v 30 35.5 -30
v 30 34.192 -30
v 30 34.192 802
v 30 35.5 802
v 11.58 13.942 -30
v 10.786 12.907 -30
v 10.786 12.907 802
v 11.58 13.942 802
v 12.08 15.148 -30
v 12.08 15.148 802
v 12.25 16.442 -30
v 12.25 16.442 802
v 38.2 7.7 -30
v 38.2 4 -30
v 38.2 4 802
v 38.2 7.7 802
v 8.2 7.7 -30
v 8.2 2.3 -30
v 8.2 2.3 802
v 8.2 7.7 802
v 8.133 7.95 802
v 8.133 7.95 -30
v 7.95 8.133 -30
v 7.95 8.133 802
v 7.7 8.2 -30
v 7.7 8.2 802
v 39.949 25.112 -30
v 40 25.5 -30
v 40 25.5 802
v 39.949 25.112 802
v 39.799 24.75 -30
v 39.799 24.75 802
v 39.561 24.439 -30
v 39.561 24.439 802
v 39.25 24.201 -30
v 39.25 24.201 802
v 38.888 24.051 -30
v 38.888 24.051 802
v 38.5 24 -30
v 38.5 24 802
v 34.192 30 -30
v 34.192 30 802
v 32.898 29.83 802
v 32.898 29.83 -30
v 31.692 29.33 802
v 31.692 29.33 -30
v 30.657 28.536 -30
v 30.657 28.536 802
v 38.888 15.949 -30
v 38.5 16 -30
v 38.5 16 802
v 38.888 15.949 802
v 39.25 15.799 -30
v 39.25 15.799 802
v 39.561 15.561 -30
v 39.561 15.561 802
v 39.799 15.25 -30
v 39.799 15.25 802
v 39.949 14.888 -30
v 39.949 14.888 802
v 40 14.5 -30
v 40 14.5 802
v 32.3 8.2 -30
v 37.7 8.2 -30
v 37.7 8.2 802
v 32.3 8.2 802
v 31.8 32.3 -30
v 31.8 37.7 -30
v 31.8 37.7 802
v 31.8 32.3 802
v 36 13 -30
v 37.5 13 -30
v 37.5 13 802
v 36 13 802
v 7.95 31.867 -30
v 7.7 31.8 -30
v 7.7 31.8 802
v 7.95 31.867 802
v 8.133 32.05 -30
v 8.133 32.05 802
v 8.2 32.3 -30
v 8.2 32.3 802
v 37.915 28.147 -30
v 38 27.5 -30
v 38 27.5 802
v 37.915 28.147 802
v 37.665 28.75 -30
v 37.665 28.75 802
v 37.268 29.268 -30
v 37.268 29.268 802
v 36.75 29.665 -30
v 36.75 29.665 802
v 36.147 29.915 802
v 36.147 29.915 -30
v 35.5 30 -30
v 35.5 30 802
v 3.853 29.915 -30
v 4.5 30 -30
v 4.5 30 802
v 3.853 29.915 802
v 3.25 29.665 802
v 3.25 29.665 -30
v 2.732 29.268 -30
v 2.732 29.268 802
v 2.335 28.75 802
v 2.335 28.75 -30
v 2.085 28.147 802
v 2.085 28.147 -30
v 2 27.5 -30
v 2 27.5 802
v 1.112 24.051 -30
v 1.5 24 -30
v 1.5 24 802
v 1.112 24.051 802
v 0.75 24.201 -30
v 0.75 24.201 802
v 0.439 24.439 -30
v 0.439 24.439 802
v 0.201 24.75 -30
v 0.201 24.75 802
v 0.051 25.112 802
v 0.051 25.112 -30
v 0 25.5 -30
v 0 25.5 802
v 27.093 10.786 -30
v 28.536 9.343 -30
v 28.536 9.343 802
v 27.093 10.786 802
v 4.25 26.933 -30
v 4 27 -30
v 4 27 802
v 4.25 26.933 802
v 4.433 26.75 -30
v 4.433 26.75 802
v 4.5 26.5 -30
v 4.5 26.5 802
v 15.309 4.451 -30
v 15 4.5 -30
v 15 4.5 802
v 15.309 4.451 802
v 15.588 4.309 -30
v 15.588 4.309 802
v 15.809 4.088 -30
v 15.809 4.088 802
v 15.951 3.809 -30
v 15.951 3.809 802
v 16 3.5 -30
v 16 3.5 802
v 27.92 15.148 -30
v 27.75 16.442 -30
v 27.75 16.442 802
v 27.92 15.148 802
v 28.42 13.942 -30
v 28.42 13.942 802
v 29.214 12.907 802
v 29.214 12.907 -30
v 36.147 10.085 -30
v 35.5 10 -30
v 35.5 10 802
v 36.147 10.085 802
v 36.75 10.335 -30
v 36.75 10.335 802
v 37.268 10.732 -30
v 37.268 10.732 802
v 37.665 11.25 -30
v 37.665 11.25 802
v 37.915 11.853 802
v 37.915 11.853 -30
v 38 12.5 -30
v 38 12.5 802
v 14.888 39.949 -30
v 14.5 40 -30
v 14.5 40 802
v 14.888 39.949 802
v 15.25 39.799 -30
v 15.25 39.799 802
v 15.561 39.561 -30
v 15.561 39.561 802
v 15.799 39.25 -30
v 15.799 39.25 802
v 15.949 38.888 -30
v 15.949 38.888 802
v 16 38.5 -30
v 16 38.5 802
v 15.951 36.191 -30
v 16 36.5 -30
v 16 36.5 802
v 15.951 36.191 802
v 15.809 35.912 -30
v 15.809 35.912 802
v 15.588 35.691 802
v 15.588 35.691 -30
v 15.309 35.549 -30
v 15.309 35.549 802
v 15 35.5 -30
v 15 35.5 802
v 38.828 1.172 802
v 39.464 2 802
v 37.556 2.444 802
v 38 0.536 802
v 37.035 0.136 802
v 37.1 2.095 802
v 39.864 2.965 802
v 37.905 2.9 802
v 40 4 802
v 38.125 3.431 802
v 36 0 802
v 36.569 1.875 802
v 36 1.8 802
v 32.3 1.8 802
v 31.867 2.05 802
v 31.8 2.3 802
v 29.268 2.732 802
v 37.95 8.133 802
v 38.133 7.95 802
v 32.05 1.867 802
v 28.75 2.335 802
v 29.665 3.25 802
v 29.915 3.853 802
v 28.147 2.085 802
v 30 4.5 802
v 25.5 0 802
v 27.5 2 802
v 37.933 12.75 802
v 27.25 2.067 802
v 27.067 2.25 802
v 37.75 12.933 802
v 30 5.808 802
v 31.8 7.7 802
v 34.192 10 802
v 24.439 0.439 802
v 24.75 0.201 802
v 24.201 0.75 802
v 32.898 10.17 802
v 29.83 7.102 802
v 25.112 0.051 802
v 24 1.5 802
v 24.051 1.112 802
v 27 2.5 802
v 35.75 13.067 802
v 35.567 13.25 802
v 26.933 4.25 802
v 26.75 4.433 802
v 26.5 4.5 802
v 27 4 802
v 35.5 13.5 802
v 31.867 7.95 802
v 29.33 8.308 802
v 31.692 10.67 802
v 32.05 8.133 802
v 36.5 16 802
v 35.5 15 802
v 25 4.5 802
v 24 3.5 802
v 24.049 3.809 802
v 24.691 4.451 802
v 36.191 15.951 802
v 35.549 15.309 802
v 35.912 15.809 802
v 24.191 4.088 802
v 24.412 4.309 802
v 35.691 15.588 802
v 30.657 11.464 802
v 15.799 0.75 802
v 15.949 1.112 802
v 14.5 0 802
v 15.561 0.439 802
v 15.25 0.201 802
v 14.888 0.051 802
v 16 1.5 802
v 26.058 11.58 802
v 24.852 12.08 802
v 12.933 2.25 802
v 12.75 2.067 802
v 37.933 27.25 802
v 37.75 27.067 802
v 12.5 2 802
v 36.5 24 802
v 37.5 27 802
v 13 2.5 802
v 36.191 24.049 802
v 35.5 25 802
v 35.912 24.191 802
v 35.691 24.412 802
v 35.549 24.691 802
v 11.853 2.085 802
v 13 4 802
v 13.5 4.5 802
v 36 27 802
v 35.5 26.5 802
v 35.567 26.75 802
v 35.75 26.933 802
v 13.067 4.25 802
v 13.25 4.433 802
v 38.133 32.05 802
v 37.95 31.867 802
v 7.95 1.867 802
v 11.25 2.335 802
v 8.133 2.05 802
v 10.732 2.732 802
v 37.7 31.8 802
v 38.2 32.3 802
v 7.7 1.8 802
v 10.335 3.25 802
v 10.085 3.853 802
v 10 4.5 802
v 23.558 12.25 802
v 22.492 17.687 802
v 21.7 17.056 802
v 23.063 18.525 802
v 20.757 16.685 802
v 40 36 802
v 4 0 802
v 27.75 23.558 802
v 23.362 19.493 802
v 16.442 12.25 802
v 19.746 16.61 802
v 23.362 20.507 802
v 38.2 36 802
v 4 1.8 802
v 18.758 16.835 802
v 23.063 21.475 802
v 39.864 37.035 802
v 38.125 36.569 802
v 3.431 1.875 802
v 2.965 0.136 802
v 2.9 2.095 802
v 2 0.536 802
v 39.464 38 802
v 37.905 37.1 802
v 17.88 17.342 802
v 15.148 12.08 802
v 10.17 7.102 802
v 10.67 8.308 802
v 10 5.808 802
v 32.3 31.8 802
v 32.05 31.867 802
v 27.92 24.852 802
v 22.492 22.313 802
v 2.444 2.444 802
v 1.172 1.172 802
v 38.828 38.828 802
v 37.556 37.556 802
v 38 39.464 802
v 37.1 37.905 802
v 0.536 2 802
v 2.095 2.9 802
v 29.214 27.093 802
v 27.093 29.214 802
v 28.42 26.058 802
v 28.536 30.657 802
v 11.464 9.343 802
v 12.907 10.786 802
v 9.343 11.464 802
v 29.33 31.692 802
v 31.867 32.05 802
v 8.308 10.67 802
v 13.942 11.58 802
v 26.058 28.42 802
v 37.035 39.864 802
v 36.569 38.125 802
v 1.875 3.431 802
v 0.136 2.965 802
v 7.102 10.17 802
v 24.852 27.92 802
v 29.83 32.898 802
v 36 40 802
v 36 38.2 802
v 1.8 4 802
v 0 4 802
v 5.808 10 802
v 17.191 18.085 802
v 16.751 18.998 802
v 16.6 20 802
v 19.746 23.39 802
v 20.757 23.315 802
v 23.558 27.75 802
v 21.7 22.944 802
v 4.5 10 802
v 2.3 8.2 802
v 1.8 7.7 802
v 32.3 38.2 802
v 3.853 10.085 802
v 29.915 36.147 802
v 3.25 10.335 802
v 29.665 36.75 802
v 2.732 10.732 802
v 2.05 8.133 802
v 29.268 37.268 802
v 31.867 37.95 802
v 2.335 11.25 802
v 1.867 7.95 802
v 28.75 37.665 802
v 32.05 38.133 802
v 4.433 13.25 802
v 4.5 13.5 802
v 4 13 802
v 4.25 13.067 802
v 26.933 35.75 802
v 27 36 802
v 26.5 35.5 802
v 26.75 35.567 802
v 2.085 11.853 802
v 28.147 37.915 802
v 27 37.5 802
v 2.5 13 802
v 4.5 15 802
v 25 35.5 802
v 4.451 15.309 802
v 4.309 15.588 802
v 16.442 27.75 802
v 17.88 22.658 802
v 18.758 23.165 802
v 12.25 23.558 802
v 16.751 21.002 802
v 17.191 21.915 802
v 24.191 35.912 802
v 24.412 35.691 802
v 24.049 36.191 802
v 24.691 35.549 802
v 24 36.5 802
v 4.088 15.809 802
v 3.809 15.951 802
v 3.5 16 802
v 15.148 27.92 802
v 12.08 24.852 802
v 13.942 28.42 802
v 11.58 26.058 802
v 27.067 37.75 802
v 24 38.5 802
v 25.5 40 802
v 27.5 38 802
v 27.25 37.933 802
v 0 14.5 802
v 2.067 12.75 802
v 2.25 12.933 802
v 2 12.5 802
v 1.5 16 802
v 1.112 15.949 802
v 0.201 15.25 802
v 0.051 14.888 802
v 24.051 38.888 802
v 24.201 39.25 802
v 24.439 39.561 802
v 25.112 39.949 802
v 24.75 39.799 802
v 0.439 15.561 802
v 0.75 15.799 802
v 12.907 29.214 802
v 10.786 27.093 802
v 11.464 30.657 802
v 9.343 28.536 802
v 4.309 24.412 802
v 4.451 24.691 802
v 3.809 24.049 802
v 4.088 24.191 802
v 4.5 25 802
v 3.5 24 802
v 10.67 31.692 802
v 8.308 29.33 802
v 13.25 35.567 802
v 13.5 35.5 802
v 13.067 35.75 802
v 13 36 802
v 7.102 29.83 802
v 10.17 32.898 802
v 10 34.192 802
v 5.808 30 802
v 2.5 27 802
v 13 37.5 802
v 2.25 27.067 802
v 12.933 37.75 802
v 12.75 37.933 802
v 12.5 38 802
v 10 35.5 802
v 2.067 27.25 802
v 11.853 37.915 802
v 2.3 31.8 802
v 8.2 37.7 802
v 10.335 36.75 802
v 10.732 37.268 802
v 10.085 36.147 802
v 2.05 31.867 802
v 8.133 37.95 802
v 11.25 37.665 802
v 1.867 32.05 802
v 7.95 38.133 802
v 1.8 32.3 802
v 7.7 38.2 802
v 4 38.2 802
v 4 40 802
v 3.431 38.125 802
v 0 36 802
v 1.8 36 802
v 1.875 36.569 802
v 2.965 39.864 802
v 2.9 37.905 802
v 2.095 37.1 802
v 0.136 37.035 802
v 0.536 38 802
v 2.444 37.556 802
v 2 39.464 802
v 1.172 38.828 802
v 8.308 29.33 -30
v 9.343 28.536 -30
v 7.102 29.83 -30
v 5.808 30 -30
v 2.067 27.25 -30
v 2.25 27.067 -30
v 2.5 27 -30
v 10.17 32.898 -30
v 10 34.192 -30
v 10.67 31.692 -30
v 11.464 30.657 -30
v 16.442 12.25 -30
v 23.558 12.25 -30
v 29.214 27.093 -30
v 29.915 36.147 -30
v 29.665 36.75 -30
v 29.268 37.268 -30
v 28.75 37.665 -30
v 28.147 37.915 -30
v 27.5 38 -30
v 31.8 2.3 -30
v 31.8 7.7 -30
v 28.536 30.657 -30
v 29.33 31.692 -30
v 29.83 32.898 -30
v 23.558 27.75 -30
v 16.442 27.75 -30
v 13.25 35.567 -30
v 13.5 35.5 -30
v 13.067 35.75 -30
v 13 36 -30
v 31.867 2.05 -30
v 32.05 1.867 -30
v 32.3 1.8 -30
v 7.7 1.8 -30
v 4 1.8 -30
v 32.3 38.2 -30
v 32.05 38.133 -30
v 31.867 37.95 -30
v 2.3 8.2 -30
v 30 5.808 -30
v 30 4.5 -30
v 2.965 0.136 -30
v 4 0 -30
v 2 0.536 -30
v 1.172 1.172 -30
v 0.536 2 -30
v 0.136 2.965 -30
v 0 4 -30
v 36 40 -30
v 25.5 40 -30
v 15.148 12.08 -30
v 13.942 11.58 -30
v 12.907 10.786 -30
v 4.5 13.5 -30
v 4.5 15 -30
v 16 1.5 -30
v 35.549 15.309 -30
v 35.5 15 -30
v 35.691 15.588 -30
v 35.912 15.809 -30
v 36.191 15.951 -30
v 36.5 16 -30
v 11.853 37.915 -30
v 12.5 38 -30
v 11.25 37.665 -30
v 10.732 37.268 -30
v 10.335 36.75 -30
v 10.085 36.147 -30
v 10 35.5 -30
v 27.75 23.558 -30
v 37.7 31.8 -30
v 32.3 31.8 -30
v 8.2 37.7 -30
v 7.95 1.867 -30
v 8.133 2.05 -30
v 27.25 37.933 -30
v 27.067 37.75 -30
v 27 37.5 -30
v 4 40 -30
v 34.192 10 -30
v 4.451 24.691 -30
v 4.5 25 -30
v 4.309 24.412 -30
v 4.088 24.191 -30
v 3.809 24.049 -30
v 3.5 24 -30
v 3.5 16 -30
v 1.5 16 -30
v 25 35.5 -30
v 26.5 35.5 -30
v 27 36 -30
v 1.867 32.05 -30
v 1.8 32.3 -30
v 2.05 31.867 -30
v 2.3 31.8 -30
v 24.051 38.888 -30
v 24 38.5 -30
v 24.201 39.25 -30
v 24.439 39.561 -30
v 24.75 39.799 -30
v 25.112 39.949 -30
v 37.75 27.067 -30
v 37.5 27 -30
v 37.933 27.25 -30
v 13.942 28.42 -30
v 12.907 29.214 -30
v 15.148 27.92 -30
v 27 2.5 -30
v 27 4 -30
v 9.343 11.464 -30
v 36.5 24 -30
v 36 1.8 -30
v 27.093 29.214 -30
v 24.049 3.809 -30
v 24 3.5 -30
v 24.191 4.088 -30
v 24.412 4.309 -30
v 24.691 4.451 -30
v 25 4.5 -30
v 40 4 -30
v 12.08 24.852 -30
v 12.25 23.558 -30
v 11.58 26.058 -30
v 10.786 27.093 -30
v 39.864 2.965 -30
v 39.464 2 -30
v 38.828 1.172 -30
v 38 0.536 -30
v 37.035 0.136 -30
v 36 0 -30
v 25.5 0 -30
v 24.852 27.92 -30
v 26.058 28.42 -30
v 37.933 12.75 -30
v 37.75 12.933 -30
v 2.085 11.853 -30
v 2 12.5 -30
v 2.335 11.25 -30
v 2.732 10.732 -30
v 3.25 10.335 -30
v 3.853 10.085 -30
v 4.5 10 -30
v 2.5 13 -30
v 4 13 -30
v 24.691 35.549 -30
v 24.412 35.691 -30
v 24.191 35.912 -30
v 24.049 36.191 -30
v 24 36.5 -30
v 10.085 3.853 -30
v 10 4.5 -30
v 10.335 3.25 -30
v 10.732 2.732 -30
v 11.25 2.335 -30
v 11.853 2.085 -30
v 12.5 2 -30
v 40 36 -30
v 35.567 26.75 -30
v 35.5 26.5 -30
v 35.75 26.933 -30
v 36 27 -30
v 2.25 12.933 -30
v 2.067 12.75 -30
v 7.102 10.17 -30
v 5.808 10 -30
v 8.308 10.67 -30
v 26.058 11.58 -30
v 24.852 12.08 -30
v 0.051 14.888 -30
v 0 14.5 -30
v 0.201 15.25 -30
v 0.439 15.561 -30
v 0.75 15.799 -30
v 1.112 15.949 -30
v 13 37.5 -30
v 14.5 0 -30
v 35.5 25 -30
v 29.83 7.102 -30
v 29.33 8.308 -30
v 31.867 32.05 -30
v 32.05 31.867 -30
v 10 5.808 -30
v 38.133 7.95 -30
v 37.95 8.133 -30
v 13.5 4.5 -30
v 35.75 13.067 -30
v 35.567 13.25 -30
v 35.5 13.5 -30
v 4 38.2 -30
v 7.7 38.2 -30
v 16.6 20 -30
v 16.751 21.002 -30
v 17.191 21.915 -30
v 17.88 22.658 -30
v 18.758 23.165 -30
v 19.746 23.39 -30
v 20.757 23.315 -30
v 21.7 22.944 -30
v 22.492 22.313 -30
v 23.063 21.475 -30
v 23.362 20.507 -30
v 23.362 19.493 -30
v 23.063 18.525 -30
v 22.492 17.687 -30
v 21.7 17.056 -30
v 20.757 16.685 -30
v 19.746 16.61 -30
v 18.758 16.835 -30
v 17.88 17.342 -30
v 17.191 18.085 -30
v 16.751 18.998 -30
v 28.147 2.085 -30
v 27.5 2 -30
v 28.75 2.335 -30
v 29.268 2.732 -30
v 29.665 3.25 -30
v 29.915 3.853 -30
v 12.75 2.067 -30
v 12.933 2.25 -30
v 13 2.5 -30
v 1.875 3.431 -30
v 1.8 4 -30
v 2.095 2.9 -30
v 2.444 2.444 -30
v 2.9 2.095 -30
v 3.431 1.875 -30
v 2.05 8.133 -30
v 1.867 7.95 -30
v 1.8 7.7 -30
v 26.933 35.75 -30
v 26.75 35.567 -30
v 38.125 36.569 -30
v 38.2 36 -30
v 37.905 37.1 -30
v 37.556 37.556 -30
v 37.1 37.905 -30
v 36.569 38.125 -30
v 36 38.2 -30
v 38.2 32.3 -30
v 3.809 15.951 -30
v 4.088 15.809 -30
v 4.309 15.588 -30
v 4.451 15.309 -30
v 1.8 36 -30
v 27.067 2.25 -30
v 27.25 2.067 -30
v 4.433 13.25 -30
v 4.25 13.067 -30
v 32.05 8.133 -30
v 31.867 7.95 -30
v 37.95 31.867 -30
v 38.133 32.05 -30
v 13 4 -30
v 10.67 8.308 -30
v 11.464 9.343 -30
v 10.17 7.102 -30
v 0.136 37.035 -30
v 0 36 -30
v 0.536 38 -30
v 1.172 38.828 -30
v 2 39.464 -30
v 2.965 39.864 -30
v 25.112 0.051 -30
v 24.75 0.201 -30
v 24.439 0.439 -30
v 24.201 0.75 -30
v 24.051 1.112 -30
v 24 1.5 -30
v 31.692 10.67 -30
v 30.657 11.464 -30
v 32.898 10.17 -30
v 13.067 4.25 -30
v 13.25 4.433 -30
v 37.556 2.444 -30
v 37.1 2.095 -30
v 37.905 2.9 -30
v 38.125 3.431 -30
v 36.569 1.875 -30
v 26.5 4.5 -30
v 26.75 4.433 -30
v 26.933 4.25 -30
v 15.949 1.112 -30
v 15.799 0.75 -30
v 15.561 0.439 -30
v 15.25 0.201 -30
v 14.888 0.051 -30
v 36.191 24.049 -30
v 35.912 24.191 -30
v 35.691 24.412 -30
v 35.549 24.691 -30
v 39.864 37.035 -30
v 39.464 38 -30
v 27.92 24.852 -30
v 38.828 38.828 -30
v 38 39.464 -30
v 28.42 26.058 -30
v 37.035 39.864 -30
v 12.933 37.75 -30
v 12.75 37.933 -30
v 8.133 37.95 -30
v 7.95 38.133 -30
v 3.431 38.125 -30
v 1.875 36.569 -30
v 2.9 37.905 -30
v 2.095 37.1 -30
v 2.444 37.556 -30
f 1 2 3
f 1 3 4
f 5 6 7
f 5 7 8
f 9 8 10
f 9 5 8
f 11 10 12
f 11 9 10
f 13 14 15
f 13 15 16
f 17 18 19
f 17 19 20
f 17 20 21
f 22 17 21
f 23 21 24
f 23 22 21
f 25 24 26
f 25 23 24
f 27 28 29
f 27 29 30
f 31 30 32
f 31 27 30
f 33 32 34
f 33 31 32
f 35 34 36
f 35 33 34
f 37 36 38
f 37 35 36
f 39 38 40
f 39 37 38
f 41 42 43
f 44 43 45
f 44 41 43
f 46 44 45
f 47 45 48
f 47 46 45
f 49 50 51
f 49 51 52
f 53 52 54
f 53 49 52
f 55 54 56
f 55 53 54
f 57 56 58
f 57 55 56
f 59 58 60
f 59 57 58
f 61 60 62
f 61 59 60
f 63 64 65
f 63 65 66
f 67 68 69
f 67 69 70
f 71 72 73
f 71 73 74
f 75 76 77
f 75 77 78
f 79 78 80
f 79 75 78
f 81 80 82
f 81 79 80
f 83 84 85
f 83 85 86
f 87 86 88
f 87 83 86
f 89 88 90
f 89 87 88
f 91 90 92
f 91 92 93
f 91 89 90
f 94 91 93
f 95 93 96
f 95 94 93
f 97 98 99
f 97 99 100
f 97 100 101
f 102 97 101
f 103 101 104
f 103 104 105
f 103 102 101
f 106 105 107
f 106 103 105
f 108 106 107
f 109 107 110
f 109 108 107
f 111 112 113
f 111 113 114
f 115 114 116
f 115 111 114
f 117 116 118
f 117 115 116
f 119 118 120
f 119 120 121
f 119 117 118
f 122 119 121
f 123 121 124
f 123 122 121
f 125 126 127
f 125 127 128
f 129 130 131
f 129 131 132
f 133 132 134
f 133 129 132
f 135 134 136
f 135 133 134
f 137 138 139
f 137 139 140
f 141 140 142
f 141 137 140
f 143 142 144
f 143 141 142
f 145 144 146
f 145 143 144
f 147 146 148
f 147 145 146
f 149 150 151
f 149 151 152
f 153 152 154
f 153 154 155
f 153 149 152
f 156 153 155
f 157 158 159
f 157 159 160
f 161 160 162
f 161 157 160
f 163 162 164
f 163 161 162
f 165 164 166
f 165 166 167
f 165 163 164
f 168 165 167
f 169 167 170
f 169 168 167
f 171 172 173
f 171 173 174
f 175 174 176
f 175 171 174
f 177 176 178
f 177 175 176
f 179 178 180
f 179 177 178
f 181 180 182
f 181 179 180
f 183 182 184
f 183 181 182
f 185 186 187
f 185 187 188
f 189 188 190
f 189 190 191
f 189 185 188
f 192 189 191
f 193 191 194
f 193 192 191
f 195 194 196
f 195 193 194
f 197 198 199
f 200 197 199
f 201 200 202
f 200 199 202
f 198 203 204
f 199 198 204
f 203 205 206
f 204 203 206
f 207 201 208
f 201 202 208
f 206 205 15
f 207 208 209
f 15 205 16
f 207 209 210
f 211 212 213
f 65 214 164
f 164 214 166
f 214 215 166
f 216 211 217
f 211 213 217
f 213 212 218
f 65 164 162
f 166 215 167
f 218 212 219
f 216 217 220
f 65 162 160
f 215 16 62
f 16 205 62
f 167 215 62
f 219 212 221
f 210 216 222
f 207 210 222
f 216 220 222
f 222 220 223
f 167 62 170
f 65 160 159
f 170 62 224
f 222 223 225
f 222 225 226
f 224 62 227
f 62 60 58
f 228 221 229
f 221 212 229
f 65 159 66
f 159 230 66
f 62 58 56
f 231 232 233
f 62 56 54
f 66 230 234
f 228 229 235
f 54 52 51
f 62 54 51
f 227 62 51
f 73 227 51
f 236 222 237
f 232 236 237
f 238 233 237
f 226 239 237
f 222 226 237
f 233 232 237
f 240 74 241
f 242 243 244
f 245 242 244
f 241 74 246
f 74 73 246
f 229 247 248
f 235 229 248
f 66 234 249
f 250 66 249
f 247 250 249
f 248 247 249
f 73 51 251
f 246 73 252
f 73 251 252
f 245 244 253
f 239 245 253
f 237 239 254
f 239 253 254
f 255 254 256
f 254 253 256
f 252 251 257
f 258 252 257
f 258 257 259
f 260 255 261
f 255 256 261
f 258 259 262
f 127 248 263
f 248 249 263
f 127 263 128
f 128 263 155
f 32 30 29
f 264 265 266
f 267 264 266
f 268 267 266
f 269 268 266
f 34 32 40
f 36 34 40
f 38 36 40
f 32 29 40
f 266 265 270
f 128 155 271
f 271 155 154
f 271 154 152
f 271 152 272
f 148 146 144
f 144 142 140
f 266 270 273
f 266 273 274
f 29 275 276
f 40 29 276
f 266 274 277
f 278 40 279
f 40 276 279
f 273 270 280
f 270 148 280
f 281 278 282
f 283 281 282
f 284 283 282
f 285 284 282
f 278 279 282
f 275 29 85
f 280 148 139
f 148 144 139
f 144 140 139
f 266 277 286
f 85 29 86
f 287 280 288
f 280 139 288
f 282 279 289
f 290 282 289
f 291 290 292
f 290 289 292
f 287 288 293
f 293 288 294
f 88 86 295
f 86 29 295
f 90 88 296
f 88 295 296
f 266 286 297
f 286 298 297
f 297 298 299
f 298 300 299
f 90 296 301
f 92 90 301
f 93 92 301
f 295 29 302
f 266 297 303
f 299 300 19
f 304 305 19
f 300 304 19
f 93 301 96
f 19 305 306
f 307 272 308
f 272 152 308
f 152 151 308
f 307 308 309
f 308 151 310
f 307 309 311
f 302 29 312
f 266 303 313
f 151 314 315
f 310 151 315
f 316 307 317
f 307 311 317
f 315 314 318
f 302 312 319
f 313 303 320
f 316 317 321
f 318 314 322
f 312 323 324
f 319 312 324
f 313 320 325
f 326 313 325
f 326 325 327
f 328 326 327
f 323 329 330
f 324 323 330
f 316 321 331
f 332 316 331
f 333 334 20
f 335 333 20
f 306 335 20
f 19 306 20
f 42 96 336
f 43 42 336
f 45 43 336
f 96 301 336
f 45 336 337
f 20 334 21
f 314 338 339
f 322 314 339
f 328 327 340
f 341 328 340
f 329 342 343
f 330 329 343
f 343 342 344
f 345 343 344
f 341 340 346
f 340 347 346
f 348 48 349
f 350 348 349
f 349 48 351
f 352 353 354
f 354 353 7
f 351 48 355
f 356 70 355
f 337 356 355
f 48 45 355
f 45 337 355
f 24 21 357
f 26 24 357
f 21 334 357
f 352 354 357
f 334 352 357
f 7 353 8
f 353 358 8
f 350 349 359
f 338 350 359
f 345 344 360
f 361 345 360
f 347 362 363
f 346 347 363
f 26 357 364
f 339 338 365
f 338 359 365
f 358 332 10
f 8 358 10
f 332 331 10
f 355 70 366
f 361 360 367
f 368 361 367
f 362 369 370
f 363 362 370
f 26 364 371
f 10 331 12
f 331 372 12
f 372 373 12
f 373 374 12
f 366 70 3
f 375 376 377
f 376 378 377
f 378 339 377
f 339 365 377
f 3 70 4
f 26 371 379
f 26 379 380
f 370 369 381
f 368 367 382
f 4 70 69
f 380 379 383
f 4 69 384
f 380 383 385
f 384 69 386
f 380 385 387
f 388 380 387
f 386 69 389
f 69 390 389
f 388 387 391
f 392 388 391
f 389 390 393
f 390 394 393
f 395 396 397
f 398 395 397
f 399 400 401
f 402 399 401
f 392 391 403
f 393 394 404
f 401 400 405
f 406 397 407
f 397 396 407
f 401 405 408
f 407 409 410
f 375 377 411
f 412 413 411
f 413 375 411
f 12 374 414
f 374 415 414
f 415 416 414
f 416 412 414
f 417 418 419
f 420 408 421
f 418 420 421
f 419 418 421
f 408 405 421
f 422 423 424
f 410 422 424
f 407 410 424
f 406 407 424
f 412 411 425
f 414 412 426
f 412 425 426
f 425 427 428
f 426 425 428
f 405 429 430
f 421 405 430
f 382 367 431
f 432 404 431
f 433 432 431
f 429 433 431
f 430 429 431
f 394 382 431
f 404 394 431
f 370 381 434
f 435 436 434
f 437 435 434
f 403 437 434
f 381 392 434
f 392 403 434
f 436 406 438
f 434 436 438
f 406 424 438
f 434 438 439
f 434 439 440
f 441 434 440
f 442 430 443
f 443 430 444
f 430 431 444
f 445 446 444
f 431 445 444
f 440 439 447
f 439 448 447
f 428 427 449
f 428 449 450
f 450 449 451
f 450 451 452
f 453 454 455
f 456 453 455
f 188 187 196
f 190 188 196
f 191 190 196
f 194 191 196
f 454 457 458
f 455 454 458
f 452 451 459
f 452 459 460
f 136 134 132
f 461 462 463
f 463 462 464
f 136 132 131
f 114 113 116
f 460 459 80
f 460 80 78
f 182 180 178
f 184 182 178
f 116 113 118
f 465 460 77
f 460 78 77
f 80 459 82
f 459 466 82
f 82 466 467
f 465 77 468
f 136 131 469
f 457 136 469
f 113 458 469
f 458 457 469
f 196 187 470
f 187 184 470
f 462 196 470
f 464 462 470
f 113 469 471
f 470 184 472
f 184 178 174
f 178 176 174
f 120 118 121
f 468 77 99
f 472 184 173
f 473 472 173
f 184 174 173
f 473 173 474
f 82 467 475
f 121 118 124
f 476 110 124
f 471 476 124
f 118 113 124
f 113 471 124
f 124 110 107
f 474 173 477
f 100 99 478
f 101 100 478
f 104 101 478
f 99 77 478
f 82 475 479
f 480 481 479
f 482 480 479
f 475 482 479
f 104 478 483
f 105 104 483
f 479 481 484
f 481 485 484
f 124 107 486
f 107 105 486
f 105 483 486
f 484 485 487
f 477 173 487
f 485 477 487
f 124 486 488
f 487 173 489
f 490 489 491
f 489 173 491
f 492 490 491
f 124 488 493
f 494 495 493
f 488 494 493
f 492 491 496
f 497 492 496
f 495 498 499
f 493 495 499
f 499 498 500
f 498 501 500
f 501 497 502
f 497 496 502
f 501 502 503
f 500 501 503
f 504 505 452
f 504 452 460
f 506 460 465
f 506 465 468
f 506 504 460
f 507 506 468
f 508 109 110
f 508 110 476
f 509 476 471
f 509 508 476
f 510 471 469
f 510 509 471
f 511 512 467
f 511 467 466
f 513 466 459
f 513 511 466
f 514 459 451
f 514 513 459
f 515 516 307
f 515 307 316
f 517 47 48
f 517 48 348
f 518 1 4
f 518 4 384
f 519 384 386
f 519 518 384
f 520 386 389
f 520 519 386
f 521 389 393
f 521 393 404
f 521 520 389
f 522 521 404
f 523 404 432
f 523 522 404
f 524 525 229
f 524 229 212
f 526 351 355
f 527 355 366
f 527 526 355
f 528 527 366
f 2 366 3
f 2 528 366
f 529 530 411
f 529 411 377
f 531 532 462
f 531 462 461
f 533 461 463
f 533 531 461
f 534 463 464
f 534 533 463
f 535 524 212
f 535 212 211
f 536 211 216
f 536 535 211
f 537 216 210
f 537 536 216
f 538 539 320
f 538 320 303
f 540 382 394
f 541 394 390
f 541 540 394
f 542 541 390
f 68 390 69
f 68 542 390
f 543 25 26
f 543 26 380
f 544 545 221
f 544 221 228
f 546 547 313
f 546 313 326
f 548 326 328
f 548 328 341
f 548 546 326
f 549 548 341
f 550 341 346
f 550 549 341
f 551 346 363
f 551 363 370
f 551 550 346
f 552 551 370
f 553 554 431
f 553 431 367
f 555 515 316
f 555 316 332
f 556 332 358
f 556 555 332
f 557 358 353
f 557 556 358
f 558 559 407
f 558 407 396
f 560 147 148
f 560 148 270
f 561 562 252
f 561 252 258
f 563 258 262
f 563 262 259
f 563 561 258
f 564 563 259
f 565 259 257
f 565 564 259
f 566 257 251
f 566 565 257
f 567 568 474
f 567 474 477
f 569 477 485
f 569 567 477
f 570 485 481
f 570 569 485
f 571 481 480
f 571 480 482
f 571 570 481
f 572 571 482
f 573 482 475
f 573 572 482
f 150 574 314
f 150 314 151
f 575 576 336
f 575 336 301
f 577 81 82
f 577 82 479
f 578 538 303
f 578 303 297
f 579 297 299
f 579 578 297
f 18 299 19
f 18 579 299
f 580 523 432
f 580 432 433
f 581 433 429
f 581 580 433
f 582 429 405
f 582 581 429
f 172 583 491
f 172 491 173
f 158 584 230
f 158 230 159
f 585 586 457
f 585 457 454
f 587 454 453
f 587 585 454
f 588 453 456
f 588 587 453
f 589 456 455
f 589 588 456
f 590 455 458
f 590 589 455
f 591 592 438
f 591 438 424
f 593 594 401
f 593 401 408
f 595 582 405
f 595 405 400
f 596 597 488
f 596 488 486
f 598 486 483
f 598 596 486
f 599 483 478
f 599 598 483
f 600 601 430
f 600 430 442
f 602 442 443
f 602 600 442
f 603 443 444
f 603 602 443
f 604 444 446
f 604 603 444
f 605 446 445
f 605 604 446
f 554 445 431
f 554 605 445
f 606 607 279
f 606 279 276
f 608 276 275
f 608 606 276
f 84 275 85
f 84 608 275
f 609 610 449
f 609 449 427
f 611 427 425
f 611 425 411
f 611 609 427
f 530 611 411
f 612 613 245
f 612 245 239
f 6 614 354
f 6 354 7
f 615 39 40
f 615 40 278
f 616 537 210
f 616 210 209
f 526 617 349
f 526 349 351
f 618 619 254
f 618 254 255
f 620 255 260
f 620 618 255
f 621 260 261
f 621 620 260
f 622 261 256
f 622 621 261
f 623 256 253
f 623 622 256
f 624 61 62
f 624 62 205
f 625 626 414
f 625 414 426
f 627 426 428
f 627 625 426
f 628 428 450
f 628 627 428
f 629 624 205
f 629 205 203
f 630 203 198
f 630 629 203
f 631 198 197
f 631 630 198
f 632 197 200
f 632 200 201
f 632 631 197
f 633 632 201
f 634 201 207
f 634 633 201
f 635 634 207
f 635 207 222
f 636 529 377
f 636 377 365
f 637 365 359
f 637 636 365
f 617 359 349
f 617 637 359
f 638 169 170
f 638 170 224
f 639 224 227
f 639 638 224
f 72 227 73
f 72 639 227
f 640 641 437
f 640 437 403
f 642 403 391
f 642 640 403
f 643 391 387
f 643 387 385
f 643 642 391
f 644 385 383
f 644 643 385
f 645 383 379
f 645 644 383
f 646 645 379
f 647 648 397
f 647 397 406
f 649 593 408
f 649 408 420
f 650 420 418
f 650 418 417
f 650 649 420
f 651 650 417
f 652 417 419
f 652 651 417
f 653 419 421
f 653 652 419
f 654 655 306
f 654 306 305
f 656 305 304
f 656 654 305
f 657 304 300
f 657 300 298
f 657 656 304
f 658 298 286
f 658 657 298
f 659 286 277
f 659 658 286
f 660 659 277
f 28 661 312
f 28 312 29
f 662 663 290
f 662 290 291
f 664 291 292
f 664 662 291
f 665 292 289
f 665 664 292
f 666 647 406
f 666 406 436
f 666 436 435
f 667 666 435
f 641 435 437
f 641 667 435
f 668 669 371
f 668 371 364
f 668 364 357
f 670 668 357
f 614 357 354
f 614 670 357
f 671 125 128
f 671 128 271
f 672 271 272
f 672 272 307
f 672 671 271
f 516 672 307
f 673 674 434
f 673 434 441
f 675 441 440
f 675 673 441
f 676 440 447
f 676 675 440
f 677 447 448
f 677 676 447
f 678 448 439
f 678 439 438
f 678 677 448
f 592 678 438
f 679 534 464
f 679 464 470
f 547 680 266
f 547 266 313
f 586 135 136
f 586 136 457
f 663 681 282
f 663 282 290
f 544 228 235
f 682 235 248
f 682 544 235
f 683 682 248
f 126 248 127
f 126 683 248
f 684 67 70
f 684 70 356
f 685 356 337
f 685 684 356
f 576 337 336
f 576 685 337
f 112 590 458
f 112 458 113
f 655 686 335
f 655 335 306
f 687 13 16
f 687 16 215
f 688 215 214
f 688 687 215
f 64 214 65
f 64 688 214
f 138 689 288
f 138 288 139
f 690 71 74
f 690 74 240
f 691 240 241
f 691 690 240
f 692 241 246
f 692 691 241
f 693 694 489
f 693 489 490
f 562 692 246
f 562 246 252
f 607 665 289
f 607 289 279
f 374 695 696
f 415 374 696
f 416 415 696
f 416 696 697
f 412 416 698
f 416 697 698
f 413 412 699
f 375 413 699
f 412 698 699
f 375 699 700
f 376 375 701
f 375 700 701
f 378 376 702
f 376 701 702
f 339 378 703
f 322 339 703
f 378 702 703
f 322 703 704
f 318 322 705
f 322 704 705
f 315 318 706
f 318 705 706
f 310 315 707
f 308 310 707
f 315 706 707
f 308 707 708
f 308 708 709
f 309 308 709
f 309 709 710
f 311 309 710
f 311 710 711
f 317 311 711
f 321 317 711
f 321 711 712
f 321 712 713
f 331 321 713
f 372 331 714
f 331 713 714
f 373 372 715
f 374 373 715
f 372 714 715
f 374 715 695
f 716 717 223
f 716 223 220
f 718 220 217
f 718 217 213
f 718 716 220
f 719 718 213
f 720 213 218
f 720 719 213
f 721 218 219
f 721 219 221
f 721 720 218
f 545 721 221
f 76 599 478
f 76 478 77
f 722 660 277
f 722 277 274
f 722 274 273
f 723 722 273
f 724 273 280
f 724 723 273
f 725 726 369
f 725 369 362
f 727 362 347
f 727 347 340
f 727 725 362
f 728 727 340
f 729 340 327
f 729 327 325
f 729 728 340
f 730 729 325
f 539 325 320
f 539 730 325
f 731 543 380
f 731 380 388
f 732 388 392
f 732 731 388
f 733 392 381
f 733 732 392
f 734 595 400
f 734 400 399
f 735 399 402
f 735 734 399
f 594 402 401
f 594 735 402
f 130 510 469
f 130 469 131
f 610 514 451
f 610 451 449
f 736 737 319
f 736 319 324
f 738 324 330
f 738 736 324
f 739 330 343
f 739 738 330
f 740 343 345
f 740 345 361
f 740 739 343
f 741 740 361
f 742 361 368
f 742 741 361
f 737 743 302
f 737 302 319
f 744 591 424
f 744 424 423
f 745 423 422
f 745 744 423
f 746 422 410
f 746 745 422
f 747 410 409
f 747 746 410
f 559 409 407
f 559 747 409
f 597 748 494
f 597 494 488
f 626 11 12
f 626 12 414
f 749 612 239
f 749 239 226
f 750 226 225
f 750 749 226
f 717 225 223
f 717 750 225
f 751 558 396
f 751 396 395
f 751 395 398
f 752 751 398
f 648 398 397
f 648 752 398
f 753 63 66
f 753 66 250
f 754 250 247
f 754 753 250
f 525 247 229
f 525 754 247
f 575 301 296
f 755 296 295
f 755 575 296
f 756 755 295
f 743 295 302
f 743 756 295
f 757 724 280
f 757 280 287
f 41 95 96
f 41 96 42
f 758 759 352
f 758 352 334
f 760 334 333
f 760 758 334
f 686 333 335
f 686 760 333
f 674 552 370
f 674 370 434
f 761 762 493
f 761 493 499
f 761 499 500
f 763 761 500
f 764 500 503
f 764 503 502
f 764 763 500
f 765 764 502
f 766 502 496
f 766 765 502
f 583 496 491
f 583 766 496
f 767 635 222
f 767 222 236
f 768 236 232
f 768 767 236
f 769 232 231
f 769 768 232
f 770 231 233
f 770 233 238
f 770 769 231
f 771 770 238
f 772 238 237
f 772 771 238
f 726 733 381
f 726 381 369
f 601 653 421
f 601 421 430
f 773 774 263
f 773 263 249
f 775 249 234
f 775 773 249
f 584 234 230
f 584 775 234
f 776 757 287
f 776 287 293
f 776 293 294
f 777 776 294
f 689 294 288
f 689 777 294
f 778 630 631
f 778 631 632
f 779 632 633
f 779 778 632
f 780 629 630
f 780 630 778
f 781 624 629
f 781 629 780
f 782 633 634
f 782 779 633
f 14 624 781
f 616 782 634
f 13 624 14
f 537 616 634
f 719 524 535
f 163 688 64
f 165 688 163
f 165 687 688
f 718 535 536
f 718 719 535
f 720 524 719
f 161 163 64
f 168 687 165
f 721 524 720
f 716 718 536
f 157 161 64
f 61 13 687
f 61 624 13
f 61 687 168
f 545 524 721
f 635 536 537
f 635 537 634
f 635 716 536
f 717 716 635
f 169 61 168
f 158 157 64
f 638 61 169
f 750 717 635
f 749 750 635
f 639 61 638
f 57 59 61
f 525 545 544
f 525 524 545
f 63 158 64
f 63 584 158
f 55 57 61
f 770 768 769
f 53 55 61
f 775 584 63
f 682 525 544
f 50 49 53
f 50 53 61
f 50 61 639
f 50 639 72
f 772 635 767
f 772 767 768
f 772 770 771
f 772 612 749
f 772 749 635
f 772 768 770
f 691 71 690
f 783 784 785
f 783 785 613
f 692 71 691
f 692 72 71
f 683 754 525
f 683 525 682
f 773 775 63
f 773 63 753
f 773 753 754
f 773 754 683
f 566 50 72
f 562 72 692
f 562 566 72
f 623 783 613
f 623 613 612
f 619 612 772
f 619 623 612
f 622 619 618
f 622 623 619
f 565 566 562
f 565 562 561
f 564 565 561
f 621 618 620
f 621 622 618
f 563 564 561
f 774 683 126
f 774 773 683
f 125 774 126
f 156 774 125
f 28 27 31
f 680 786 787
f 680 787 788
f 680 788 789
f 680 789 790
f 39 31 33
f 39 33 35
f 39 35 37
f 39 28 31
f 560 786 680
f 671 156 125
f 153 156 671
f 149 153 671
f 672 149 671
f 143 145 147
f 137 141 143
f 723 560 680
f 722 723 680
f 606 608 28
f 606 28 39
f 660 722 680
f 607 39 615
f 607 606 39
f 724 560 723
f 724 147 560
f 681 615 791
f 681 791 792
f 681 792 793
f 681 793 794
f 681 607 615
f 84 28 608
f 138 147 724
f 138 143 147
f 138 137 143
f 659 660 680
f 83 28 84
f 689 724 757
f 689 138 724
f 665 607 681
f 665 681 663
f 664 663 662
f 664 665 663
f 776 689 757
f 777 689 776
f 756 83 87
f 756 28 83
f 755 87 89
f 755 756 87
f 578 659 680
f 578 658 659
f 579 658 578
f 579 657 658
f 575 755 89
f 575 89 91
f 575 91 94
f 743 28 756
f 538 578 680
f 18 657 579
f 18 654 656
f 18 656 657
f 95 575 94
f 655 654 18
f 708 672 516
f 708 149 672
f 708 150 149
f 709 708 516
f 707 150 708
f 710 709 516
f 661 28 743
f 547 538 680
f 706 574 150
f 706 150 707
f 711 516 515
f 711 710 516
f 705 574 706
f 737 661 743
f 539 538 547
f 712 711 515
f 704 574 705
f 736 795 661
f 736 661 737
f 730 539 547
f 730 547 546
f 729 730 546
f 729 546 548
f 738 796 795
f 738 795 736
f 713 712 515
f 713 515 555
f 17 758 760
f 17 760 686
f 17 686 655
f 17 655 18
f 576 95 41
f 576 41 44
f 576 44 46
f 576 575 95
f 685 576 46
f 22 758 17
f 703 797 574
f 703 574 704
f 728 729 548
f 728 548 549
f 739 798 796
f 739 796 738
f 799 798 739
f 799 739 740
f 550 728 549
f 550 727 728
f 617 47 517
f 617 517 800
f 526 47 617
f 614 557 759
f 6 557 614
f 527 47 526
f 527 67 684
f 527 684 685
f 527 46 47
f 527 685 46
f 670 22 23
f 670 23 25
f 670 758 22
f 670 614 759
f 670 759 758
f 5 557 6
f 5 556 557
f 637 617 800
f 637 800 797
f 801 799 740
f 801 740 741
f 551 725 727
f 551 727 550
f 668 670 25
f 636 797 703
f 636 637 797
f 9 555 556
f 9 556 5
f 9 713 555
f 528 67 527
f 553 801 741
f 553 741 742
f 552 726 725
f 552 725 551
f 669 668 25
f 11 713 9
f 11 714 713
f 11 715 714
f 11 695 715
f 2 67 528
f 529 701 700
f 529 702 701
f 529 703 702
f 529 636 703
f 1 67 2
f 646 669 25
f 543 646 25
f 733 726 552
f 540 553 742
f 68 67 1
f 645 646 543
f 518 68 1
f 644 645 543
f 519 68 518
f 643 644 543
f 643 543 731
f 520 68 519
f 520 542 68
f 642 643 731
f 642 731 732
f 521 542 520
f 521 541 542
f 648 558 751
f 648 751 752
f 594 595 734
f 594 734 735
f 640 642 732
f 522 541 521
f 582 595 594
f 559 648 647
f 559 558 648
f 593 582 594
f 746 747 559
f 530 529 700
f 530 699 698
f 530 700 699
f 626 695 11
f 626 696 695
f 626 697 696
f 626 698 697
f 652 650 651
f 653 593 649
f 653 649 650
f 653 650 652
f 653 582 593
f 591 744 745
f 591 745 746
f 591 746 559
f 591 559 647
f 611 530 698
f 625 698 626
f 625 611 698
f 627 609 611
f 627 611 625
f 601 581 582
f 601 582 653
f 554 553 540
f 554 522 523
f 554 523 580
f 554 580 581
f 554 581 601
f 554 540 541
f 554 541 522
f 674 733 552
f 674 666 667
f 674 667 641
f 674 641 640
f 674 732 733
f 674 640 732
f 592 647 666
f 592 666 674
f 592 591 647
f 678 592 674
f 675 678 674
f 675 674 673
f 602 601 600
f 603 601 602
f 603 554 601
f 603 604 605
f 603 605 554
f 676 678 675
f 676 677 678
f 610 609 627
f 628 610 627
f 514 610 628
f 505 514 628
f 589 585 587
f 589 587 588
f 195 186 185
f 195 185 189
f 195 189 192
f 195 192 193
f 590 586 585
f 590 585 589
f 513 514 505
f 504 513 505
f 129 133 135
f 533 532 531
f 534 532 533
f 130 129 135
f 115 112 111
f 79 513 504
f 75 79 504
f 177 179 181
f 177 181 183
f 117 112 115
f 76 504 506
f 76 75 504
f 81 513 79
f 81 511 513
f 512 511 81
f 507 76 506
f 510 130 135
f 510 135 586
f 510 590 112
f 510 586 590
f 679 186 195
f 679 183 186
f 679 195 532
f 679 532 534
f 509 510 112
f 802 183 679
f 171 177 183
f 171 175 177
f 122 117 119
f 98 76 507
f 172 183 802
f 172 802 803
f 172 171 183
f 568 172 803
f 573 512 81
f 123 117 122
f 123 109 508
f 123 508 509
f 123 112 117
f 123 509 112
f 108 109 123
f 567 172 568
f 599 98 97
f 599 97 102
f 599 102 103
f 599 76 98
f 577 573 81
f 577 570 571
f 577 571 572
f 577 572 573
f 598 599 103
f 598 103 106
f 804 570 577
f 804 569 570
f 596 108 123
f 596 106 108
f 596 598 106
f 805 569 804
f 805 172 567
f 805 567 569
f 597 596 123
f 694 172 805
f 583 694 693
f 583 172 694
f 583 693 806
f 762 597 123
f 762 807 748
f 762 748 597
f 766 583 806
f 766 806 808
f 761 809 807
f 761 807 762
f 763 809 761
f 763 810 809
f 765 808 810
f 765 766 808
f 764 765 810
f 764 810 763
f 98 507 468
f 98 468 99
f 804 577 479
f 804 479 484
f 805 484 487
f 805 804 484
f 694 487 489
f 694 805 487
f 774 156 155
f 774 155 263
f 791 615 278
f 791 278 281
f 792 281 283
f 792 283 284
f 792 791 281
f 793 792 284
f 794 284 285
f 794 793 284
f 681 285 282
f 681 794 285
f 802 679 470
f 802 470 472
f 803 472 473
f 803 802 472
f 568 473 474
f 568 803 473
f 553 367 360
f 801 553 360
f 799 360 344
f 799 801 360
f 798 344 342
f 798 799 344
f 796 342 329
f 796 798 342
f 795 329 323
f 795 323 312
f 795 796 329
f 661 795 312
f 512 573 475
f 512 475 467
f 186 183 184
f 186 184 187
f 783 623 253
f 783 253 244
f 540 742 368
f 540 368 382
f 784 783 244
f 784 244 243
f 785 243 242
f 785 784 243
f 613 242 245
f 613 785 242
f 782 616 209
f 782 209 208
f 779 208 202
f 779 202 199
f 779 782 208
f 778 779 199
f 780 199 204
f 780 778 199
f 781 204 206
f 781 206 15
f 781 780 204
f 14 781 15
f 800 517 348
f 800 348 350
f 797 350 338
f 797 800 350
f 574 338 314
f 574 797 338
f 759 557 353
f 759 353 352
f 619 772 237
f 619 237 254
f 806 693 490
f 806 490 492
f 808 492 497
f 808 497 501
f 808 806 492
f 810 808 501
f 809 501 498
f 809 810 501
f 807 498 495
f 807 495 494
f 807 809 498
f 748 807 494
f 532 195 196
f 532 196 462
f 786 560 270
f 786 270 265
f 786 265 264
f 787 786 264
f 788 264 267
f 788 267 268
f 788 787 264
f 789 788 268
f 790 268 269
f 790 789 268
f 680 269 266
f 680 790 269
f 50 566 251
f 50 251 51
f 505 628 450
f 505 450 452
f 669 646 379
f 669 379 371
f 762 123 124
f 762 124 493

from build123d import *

# Parameters (mm, degrees)
ESQUISSE1_R        = 3.4
BOSS_EXTRU_1_DEPTH = 832


with BuildPart() as part:
    # Esquisse1 → Boss.-Extru.1 (new body)
    with BuildSketch(Plane(origin=(0, 0, -30), x_dir=(-1, 0, 0), z_dir=(0, 0, -1))):
        with BuildLine():
            Line((-4.5, 15), (-4.5, 13.5))
            ThreePointArc((-4.5, 13.5), (-4.353553391, 13.146446609), (-4, 13))
            Line((-4, 13), (-2.5, 13))
            ThreePointArc((-2.5, 13), (-2.146446609, 12.853553391), (-2, 12.5))
            ThreePointArc((-2, 12.5), (-2.732233047, 10.732233047), (-4.5, 10))
            Line((-4.5, 10), (-5.807611845, 10))
            ThreePointArc((-5.807611845, 10), (-7.721029006, 10.380602337), (-9.343145751, 11.464466094))
            Line((-9.343145751, 11.464466094), (-10.785533906, 12.906854249))
            ThreePointArc((-10.785533906, 12.906854249), (-11.869397663, 14.528970994), (-12.25, 16.442388155))
            Line((-12.25, 16.442388155), (-12.25, 23.557611845))
            ThreePointArc((-12.25, 23.557611845), (-11.869397663, 25.471029006), (-10.785533906, 27.093145751))
            Line((-10.785533906, 27.093145751), (-9.343145751, 28.535533906))
            ThreePointArc((-9.343145751, 28.535533906), (-7.721029006, 29.619397663), (-5.807611845, 30))
            Line((-5.807611845, 30), (-4.5, 30))
            ThreePointArc((-4.5, 30), (-2.732233047, 29.267766953), (-2, 27.5))
            ThreePointArc((-2, 27.5), (-2.146446609, 27.146446609), (-2.5, 27))
            Line((-2.5, 27), (-4, 27))
            ThreePointArc((-4, 27), (-4.353553391, 26.853553391), (-4.5, 26.5))
            Line((-4.5, 26.5), (-4.5, 25))
            ThreePointArc((-4.5, 25), (-4.207106781, 24.292893219), (-3.5, 24))
            Line((-3.5, 24), (-1.5, 24))
            ThreePointArc((-1.5, 24), (-0.439339828, 24.439339828), (0, 25.5))
            Line((0, 25.5), (0, 36))
            ThreePointArc((0, 36), (-1.171572875, 38.828427125), (-4, 40))
            Line((-4, 40), (-14.5, 40))
            ThreePointArc((-14.5, 40), (-15.560660172, 39.560660172), (-16, 38.5))
            Line((-16, 38.5), (-16, 36.5))
            ThreePointArc((-16, 36.5), (-15.707106781, 35.792893219), (-15, 35.5))
            Line((-15, 35.5), (-13.5, 35.5))
            ThreePointArc((-13.5, 35.5), (-13.146446609, 35.646446609), (-13, 36))
            Line((-13, 36), (-13, 37.5))
            ThreePointArc((-13, 37.5), (-12.853553391, 37.853553391), (-12.5, 38))
            ThreePointArc((-12.5, 38), (-10.732233047, 37.267766953), (-10, 35.5))
            Line((-10, 35.5), (-10, 34.192388155))
            ThreePointArc((-10, 34.192388155), (-10.380602337, 32.278970994), (-11.464466094, 30.656854249))
            Line((-11.464466094, 30.656854249), (-12.906854249, 29.214466094))
            ThreePointArc((-12.906854249, 29.214466094), (-14.528970994, 28.130602337), (-16.442388155, 27.75))
            Line((-16.442388155, 27.75), (-23.557611845, 27.75))
            ThreePointArc((-23.557611845, 27.75), (-25.471029006, 28.130602337), (-27.093145751, 29.214466094))
            Line((-27.093145751, 29.214466094), (-28.535533906, 30.656854249))
            ThreePointArc((-28.535533906, 30.656854249), (-29.619397663, 32.278970994), (-30, 34.192388155))
            Line((-30, 34.192388155), (-30, 35.5))
            ThreePointArc((-30, 35.5), (-29.267766953, 37.267766953), (-27.5, 38))
            ThreePointArc((-27.5, 38), (-27.146446609, 37.853553391), (-27, 37.5))
            Line((-27, 37.5), (-27, 36))
            ThreePointArc((-27, 36), (-26.853553391, 35.646446609), (-26.5, 35.5))
            Line((-26.5, 35.5), (-25, 35.5))
            ThreePointArc((-25, 35.5), (-24.292893219, 35.792893219), (-24, 36.5))
            Line((-24, 36.5), (-24, 38.5))
            ThreePointArc((-24, 38.5), (-24.439339828, 39.560660172), (-25.5, 40))
            Line((-25.5, 40), (-36, 40))
            ThreePointArc((-36, 40), (-38.828427125, 38.828427125), (-40, 36))
            Line((-40, 36), (-40, 25.5))
            ThreePointArc((-40, 25.5), (-39.560660172, 24.439339828), (-38.5, 24))
            Line((-38.5, 24), (-36.5, 24))
            ThreePointArc((-36.5, 24), (-35.792893219, 24.292893219), (-35.5, 25))
            Line((-35.5, 25), (-35.5, 26.5))
            ThreePointArc((-35.5, 26.5), (-35.646446609, 26.853553391), (-36, 27))
            Line((-36, 27), (-37.5, 27))
            ThreePointArc((-37.5, 27), (-37.853553391, 27.146446609), (-38, 27.5))
            ThreePointArc((-38, 27.5), (-37.267766953, 29.267766953), (-35.5, 30))
            Line((-35.5, 30), (-34.192388155, 30))
            ThreePointArc((-34.192388155, 30), (-32.278970994, 29.619397663), (-30.656854249, 28.535533906))
            Line((-30.656854249, 28.535533906), (-29.214466094, 27.093145751))
            ThreePointArc((-29.214466094, 27.093145751), (-28.130602337, 25.471029006), (-27.75, 23.557611845))
            Line((-27.75, 23.557611845), (-27.75, 16.442388155))
            ThreePointArc((-27.75, 16.442388155), (-28.130602337, 14.528970994), (-29.214466094, 12.906854249))
            Line((-29.214466094, 12.906854249), (-30.656854249, 11.464466094))
            ThreePointArc((-30.656854249, 11.464466094), (-32.278970994, 10.380602337), (-34.192388155, 10))
            Line((-34.192388155, 10), (-35.5, 10))
            ThreePointArc((-35.5, 10), (-37.267766953, 10.732233047), (-38, 12.5))
            ThreePointArc((-38, 12.5), (-37.853553391, 12.853553391), (-37.5, 13))
            Line((-37.5, 13), (-36, 13))
            ThreePointArc((-36, 13), (-35.646446609, 13.146446609), (-35.5, 13.5))
            Line((-35.5, 13.5), (-35.5, 15))
            ThreePointArc((-35.5, 15), (-35.792893219, 15.707106781), (-36.5, 16))
            Line((-36.5, 16), (-38.5, 16))
            ThreePointArc((-38.5, 16), (-39.560660172, 15.560660172), (-40, 14.5))
            Line((-40, 14.5), (-40, 4))
            ThreePointArc((-40, 4), (-38.828427125, 1.171572875), (-36, 0))
            Line((-36, 0), (-25.5, 0))
            ThreePointArc((-25.5, 0), (-24.439339828, 0.439339828), (-24, 1.5))
            Line((-24, 1.5), (-24, 3.5))
            ThreePointArc((-24, 3.5), (-24.292893219, 4.207106781), (-25, 4.5))
            Line((-25, 4.5), (-26.5, 4.5))
            ThreePointArc((-26.5, 4.5), (-26.853553391, 4.353553391), (-27, 4))
            Line((-27, 4), (-27, 2.5))
            ThreePointArc((-27, 2.5), (-27.146446609, 2.146446609), (-27.5, 2))
            ThreePointArc((-27.5, 2), (-29.267766953, 2.732233047), (-30, 4.5))
            Line((-30, 4.5), (-30, 5.807611845))
            ThreePointArc((-30, 5.807611845), (-29.619397663, 7.721029006), (-28.535533906, 9.343145751))
            Line((-28.535533906, 9.343145751), (-27.093145751, 10.785533906))
            ThreePointArc((-27.093145751, 10.785533906), (-25.471029006, 11.869397663), (-23.557611845, 12.25))
            Line((-23.557611845, 12.25), (-16.442388155, 12.25))
            ThreePointArc((-16.442388155, 12.25), (-14.528970994, 11.869397663), (-12.906854249, 10.785533906))
            Line((-12.906854249, 10.785533906), (-11.464466094, 9.343145751))
            ThreePointArc((-11.464466094, 9.343145751), (-10.380602337, 7.721029006), (-10, 5.807611845))
            Line((-10, 5.807611845), (-10, 4.5))
            ThreePointArc((-10, 4.5), (-10.732233047, 2.732233047), (-12.5, 2))
            ThreePointArc((-12.5, 2), (-12.853553391, 2.146446609), (-13, 2.5))
            Line((-13, 2.5), (-13, 4))
            ThreePointArc((-13, 4), (-13.146446609, 4.353553391), (-13.5, 4.5))
            Line((-13.5, 4.5), (-15, 4.5))
            ThreePointArc((-15, 4.5), (-15.707106781, 4.207106781), (-16, 3.5))
            Line((-16, 3.5), (-16, 1.5))
            ThreePointArc((-16, 1.5), (-15.560660172, 0.439339828), (-14.5, 0))
            Line((-14.5, 0), (-4, 0))
            ThreePointArc((-4, 0), (-1.171572875, 1.171572875), (0, 4))
            Line((0, 4), (0, 14.5))
            ThreePointArc((0, 14.5), (-0.439339828, 15.560660172), (-1.5, 16))
            Line((-1.5, 16), (-3.5, 16))
            ThreePointArc((-3.5, 16), (-4.207106781, 15.707106781), (-4.5, 15))
        make_face()
        with Locations((-20, 20)):
            Circle(ESQUISSE1_R, mode=Mode.SUBTRACT)
        with BuildLine():
            Line((-4, 1.8), (-7.7, 1.8))
            ThreePointArc((-7.7, 1.8), (-8.053553391, 1.946446609), (-8.2, 2.3))
            Line((-8.2, 2.3), (-8.2, 7.7))
            ThreePointArc((-8.2, 7.7), (-8.053553391, 8.053553391), (-7.7, 8.2))
            Line((-7.7, 8.2), (-2.3, 8.2))
            ThreePointArc((-2.3, 8.2), (-1.946446609, 8.053553391), (-1.8, 7.7))
            Line((-1.8, 7.7), (-1.8, 4))
            ThreePointArc((-1.8, 4), (-2.444365081, 2.444365081), (-4, 1.8))
        make_face(mode=Mode.SUBTRACT)
        with BuildLine():
            Line((-38.2, 4), (-38.2, 7.7))
            ThreePointArc((-38.2, 7.7), (-38.053553391, 8.053553391), (-37.7, 8.2))
            Line((-37.7, 8.2), (-32.3, 8.2))
            ThreePointArc((-32.3, 8.2), (-31.946446609, 8.053553391), (-31.8, 7.7))
            Line((-31.8, 7.7), (-31.8, 2.3))
            ThreePointArc((-31.8, 2.3), (-31.946446609, 1.946446609), (-32.3, 1.8))
            Line((-32.3, 1.8), (-36, 1.8))
            ThreePointArc((-36, 1.8), (-37.555634919, 2.444365081), (-38.2, 4))
        make_face(mode=Mode.SUBTRACT)
        with BuildLine():
            Line((-36, 38.2), (-32.3, 38.2))
            ThreePointArc((-32.3, 38.2), (-31.946446609, 38.053553391), (-31.8, 37.7))
            Line((-31.8, 37.7), (-31.8, 32.3))
            ThreePointArc((-31.8, 32.3), (-31.946446609, 31.946446609), (-32.3, 31.8))
            Line((-32.3, 31.8), (-37.7, 31.8))
            ThreePointArc((-37.7, 31.8), (-38.053553391, 31.946446609), (-38.2, 32.3))
            Line((-38.2, 32.3), (-38.2, 36))
            ThreePointArc((-38.2, 36), (-37.555634919, 37.555634919), (-36, 38.2))
        make_face(mode=Mode.SUBTRACT)
        with BuildLine():
            Line((-1.8, 36), (-1.8, 32.3))
            ThreePointArc((-1.8, 32.3), (-1.946446609, 31.946446609), (-2.3, 31.8))
            Line((-2.3, 31.8), (-7.7, 31.8))
            ThreePointArc((-7.7, 31.8), (-8.053553391, 31.946446609), (-8.2, 32.3))
            Line((-8.2, 32.3), (-8.2, 37.7))
            ThreePointArc((-8.2, 37.7), (-8.053553391, 38.053553391), (-7.7, 38.2))
            Line((-7.7, 38.2), (-4, 38.2))
            ThreePointArc((-4, 38.2), (-2.444365081, 37.555634919), (-1.8, 36))
        make_face(mode=Mode.SUBTRACT)
    extrude(amount=-BOSS_EXTRU_1_DEPTH)


solid = part.part
